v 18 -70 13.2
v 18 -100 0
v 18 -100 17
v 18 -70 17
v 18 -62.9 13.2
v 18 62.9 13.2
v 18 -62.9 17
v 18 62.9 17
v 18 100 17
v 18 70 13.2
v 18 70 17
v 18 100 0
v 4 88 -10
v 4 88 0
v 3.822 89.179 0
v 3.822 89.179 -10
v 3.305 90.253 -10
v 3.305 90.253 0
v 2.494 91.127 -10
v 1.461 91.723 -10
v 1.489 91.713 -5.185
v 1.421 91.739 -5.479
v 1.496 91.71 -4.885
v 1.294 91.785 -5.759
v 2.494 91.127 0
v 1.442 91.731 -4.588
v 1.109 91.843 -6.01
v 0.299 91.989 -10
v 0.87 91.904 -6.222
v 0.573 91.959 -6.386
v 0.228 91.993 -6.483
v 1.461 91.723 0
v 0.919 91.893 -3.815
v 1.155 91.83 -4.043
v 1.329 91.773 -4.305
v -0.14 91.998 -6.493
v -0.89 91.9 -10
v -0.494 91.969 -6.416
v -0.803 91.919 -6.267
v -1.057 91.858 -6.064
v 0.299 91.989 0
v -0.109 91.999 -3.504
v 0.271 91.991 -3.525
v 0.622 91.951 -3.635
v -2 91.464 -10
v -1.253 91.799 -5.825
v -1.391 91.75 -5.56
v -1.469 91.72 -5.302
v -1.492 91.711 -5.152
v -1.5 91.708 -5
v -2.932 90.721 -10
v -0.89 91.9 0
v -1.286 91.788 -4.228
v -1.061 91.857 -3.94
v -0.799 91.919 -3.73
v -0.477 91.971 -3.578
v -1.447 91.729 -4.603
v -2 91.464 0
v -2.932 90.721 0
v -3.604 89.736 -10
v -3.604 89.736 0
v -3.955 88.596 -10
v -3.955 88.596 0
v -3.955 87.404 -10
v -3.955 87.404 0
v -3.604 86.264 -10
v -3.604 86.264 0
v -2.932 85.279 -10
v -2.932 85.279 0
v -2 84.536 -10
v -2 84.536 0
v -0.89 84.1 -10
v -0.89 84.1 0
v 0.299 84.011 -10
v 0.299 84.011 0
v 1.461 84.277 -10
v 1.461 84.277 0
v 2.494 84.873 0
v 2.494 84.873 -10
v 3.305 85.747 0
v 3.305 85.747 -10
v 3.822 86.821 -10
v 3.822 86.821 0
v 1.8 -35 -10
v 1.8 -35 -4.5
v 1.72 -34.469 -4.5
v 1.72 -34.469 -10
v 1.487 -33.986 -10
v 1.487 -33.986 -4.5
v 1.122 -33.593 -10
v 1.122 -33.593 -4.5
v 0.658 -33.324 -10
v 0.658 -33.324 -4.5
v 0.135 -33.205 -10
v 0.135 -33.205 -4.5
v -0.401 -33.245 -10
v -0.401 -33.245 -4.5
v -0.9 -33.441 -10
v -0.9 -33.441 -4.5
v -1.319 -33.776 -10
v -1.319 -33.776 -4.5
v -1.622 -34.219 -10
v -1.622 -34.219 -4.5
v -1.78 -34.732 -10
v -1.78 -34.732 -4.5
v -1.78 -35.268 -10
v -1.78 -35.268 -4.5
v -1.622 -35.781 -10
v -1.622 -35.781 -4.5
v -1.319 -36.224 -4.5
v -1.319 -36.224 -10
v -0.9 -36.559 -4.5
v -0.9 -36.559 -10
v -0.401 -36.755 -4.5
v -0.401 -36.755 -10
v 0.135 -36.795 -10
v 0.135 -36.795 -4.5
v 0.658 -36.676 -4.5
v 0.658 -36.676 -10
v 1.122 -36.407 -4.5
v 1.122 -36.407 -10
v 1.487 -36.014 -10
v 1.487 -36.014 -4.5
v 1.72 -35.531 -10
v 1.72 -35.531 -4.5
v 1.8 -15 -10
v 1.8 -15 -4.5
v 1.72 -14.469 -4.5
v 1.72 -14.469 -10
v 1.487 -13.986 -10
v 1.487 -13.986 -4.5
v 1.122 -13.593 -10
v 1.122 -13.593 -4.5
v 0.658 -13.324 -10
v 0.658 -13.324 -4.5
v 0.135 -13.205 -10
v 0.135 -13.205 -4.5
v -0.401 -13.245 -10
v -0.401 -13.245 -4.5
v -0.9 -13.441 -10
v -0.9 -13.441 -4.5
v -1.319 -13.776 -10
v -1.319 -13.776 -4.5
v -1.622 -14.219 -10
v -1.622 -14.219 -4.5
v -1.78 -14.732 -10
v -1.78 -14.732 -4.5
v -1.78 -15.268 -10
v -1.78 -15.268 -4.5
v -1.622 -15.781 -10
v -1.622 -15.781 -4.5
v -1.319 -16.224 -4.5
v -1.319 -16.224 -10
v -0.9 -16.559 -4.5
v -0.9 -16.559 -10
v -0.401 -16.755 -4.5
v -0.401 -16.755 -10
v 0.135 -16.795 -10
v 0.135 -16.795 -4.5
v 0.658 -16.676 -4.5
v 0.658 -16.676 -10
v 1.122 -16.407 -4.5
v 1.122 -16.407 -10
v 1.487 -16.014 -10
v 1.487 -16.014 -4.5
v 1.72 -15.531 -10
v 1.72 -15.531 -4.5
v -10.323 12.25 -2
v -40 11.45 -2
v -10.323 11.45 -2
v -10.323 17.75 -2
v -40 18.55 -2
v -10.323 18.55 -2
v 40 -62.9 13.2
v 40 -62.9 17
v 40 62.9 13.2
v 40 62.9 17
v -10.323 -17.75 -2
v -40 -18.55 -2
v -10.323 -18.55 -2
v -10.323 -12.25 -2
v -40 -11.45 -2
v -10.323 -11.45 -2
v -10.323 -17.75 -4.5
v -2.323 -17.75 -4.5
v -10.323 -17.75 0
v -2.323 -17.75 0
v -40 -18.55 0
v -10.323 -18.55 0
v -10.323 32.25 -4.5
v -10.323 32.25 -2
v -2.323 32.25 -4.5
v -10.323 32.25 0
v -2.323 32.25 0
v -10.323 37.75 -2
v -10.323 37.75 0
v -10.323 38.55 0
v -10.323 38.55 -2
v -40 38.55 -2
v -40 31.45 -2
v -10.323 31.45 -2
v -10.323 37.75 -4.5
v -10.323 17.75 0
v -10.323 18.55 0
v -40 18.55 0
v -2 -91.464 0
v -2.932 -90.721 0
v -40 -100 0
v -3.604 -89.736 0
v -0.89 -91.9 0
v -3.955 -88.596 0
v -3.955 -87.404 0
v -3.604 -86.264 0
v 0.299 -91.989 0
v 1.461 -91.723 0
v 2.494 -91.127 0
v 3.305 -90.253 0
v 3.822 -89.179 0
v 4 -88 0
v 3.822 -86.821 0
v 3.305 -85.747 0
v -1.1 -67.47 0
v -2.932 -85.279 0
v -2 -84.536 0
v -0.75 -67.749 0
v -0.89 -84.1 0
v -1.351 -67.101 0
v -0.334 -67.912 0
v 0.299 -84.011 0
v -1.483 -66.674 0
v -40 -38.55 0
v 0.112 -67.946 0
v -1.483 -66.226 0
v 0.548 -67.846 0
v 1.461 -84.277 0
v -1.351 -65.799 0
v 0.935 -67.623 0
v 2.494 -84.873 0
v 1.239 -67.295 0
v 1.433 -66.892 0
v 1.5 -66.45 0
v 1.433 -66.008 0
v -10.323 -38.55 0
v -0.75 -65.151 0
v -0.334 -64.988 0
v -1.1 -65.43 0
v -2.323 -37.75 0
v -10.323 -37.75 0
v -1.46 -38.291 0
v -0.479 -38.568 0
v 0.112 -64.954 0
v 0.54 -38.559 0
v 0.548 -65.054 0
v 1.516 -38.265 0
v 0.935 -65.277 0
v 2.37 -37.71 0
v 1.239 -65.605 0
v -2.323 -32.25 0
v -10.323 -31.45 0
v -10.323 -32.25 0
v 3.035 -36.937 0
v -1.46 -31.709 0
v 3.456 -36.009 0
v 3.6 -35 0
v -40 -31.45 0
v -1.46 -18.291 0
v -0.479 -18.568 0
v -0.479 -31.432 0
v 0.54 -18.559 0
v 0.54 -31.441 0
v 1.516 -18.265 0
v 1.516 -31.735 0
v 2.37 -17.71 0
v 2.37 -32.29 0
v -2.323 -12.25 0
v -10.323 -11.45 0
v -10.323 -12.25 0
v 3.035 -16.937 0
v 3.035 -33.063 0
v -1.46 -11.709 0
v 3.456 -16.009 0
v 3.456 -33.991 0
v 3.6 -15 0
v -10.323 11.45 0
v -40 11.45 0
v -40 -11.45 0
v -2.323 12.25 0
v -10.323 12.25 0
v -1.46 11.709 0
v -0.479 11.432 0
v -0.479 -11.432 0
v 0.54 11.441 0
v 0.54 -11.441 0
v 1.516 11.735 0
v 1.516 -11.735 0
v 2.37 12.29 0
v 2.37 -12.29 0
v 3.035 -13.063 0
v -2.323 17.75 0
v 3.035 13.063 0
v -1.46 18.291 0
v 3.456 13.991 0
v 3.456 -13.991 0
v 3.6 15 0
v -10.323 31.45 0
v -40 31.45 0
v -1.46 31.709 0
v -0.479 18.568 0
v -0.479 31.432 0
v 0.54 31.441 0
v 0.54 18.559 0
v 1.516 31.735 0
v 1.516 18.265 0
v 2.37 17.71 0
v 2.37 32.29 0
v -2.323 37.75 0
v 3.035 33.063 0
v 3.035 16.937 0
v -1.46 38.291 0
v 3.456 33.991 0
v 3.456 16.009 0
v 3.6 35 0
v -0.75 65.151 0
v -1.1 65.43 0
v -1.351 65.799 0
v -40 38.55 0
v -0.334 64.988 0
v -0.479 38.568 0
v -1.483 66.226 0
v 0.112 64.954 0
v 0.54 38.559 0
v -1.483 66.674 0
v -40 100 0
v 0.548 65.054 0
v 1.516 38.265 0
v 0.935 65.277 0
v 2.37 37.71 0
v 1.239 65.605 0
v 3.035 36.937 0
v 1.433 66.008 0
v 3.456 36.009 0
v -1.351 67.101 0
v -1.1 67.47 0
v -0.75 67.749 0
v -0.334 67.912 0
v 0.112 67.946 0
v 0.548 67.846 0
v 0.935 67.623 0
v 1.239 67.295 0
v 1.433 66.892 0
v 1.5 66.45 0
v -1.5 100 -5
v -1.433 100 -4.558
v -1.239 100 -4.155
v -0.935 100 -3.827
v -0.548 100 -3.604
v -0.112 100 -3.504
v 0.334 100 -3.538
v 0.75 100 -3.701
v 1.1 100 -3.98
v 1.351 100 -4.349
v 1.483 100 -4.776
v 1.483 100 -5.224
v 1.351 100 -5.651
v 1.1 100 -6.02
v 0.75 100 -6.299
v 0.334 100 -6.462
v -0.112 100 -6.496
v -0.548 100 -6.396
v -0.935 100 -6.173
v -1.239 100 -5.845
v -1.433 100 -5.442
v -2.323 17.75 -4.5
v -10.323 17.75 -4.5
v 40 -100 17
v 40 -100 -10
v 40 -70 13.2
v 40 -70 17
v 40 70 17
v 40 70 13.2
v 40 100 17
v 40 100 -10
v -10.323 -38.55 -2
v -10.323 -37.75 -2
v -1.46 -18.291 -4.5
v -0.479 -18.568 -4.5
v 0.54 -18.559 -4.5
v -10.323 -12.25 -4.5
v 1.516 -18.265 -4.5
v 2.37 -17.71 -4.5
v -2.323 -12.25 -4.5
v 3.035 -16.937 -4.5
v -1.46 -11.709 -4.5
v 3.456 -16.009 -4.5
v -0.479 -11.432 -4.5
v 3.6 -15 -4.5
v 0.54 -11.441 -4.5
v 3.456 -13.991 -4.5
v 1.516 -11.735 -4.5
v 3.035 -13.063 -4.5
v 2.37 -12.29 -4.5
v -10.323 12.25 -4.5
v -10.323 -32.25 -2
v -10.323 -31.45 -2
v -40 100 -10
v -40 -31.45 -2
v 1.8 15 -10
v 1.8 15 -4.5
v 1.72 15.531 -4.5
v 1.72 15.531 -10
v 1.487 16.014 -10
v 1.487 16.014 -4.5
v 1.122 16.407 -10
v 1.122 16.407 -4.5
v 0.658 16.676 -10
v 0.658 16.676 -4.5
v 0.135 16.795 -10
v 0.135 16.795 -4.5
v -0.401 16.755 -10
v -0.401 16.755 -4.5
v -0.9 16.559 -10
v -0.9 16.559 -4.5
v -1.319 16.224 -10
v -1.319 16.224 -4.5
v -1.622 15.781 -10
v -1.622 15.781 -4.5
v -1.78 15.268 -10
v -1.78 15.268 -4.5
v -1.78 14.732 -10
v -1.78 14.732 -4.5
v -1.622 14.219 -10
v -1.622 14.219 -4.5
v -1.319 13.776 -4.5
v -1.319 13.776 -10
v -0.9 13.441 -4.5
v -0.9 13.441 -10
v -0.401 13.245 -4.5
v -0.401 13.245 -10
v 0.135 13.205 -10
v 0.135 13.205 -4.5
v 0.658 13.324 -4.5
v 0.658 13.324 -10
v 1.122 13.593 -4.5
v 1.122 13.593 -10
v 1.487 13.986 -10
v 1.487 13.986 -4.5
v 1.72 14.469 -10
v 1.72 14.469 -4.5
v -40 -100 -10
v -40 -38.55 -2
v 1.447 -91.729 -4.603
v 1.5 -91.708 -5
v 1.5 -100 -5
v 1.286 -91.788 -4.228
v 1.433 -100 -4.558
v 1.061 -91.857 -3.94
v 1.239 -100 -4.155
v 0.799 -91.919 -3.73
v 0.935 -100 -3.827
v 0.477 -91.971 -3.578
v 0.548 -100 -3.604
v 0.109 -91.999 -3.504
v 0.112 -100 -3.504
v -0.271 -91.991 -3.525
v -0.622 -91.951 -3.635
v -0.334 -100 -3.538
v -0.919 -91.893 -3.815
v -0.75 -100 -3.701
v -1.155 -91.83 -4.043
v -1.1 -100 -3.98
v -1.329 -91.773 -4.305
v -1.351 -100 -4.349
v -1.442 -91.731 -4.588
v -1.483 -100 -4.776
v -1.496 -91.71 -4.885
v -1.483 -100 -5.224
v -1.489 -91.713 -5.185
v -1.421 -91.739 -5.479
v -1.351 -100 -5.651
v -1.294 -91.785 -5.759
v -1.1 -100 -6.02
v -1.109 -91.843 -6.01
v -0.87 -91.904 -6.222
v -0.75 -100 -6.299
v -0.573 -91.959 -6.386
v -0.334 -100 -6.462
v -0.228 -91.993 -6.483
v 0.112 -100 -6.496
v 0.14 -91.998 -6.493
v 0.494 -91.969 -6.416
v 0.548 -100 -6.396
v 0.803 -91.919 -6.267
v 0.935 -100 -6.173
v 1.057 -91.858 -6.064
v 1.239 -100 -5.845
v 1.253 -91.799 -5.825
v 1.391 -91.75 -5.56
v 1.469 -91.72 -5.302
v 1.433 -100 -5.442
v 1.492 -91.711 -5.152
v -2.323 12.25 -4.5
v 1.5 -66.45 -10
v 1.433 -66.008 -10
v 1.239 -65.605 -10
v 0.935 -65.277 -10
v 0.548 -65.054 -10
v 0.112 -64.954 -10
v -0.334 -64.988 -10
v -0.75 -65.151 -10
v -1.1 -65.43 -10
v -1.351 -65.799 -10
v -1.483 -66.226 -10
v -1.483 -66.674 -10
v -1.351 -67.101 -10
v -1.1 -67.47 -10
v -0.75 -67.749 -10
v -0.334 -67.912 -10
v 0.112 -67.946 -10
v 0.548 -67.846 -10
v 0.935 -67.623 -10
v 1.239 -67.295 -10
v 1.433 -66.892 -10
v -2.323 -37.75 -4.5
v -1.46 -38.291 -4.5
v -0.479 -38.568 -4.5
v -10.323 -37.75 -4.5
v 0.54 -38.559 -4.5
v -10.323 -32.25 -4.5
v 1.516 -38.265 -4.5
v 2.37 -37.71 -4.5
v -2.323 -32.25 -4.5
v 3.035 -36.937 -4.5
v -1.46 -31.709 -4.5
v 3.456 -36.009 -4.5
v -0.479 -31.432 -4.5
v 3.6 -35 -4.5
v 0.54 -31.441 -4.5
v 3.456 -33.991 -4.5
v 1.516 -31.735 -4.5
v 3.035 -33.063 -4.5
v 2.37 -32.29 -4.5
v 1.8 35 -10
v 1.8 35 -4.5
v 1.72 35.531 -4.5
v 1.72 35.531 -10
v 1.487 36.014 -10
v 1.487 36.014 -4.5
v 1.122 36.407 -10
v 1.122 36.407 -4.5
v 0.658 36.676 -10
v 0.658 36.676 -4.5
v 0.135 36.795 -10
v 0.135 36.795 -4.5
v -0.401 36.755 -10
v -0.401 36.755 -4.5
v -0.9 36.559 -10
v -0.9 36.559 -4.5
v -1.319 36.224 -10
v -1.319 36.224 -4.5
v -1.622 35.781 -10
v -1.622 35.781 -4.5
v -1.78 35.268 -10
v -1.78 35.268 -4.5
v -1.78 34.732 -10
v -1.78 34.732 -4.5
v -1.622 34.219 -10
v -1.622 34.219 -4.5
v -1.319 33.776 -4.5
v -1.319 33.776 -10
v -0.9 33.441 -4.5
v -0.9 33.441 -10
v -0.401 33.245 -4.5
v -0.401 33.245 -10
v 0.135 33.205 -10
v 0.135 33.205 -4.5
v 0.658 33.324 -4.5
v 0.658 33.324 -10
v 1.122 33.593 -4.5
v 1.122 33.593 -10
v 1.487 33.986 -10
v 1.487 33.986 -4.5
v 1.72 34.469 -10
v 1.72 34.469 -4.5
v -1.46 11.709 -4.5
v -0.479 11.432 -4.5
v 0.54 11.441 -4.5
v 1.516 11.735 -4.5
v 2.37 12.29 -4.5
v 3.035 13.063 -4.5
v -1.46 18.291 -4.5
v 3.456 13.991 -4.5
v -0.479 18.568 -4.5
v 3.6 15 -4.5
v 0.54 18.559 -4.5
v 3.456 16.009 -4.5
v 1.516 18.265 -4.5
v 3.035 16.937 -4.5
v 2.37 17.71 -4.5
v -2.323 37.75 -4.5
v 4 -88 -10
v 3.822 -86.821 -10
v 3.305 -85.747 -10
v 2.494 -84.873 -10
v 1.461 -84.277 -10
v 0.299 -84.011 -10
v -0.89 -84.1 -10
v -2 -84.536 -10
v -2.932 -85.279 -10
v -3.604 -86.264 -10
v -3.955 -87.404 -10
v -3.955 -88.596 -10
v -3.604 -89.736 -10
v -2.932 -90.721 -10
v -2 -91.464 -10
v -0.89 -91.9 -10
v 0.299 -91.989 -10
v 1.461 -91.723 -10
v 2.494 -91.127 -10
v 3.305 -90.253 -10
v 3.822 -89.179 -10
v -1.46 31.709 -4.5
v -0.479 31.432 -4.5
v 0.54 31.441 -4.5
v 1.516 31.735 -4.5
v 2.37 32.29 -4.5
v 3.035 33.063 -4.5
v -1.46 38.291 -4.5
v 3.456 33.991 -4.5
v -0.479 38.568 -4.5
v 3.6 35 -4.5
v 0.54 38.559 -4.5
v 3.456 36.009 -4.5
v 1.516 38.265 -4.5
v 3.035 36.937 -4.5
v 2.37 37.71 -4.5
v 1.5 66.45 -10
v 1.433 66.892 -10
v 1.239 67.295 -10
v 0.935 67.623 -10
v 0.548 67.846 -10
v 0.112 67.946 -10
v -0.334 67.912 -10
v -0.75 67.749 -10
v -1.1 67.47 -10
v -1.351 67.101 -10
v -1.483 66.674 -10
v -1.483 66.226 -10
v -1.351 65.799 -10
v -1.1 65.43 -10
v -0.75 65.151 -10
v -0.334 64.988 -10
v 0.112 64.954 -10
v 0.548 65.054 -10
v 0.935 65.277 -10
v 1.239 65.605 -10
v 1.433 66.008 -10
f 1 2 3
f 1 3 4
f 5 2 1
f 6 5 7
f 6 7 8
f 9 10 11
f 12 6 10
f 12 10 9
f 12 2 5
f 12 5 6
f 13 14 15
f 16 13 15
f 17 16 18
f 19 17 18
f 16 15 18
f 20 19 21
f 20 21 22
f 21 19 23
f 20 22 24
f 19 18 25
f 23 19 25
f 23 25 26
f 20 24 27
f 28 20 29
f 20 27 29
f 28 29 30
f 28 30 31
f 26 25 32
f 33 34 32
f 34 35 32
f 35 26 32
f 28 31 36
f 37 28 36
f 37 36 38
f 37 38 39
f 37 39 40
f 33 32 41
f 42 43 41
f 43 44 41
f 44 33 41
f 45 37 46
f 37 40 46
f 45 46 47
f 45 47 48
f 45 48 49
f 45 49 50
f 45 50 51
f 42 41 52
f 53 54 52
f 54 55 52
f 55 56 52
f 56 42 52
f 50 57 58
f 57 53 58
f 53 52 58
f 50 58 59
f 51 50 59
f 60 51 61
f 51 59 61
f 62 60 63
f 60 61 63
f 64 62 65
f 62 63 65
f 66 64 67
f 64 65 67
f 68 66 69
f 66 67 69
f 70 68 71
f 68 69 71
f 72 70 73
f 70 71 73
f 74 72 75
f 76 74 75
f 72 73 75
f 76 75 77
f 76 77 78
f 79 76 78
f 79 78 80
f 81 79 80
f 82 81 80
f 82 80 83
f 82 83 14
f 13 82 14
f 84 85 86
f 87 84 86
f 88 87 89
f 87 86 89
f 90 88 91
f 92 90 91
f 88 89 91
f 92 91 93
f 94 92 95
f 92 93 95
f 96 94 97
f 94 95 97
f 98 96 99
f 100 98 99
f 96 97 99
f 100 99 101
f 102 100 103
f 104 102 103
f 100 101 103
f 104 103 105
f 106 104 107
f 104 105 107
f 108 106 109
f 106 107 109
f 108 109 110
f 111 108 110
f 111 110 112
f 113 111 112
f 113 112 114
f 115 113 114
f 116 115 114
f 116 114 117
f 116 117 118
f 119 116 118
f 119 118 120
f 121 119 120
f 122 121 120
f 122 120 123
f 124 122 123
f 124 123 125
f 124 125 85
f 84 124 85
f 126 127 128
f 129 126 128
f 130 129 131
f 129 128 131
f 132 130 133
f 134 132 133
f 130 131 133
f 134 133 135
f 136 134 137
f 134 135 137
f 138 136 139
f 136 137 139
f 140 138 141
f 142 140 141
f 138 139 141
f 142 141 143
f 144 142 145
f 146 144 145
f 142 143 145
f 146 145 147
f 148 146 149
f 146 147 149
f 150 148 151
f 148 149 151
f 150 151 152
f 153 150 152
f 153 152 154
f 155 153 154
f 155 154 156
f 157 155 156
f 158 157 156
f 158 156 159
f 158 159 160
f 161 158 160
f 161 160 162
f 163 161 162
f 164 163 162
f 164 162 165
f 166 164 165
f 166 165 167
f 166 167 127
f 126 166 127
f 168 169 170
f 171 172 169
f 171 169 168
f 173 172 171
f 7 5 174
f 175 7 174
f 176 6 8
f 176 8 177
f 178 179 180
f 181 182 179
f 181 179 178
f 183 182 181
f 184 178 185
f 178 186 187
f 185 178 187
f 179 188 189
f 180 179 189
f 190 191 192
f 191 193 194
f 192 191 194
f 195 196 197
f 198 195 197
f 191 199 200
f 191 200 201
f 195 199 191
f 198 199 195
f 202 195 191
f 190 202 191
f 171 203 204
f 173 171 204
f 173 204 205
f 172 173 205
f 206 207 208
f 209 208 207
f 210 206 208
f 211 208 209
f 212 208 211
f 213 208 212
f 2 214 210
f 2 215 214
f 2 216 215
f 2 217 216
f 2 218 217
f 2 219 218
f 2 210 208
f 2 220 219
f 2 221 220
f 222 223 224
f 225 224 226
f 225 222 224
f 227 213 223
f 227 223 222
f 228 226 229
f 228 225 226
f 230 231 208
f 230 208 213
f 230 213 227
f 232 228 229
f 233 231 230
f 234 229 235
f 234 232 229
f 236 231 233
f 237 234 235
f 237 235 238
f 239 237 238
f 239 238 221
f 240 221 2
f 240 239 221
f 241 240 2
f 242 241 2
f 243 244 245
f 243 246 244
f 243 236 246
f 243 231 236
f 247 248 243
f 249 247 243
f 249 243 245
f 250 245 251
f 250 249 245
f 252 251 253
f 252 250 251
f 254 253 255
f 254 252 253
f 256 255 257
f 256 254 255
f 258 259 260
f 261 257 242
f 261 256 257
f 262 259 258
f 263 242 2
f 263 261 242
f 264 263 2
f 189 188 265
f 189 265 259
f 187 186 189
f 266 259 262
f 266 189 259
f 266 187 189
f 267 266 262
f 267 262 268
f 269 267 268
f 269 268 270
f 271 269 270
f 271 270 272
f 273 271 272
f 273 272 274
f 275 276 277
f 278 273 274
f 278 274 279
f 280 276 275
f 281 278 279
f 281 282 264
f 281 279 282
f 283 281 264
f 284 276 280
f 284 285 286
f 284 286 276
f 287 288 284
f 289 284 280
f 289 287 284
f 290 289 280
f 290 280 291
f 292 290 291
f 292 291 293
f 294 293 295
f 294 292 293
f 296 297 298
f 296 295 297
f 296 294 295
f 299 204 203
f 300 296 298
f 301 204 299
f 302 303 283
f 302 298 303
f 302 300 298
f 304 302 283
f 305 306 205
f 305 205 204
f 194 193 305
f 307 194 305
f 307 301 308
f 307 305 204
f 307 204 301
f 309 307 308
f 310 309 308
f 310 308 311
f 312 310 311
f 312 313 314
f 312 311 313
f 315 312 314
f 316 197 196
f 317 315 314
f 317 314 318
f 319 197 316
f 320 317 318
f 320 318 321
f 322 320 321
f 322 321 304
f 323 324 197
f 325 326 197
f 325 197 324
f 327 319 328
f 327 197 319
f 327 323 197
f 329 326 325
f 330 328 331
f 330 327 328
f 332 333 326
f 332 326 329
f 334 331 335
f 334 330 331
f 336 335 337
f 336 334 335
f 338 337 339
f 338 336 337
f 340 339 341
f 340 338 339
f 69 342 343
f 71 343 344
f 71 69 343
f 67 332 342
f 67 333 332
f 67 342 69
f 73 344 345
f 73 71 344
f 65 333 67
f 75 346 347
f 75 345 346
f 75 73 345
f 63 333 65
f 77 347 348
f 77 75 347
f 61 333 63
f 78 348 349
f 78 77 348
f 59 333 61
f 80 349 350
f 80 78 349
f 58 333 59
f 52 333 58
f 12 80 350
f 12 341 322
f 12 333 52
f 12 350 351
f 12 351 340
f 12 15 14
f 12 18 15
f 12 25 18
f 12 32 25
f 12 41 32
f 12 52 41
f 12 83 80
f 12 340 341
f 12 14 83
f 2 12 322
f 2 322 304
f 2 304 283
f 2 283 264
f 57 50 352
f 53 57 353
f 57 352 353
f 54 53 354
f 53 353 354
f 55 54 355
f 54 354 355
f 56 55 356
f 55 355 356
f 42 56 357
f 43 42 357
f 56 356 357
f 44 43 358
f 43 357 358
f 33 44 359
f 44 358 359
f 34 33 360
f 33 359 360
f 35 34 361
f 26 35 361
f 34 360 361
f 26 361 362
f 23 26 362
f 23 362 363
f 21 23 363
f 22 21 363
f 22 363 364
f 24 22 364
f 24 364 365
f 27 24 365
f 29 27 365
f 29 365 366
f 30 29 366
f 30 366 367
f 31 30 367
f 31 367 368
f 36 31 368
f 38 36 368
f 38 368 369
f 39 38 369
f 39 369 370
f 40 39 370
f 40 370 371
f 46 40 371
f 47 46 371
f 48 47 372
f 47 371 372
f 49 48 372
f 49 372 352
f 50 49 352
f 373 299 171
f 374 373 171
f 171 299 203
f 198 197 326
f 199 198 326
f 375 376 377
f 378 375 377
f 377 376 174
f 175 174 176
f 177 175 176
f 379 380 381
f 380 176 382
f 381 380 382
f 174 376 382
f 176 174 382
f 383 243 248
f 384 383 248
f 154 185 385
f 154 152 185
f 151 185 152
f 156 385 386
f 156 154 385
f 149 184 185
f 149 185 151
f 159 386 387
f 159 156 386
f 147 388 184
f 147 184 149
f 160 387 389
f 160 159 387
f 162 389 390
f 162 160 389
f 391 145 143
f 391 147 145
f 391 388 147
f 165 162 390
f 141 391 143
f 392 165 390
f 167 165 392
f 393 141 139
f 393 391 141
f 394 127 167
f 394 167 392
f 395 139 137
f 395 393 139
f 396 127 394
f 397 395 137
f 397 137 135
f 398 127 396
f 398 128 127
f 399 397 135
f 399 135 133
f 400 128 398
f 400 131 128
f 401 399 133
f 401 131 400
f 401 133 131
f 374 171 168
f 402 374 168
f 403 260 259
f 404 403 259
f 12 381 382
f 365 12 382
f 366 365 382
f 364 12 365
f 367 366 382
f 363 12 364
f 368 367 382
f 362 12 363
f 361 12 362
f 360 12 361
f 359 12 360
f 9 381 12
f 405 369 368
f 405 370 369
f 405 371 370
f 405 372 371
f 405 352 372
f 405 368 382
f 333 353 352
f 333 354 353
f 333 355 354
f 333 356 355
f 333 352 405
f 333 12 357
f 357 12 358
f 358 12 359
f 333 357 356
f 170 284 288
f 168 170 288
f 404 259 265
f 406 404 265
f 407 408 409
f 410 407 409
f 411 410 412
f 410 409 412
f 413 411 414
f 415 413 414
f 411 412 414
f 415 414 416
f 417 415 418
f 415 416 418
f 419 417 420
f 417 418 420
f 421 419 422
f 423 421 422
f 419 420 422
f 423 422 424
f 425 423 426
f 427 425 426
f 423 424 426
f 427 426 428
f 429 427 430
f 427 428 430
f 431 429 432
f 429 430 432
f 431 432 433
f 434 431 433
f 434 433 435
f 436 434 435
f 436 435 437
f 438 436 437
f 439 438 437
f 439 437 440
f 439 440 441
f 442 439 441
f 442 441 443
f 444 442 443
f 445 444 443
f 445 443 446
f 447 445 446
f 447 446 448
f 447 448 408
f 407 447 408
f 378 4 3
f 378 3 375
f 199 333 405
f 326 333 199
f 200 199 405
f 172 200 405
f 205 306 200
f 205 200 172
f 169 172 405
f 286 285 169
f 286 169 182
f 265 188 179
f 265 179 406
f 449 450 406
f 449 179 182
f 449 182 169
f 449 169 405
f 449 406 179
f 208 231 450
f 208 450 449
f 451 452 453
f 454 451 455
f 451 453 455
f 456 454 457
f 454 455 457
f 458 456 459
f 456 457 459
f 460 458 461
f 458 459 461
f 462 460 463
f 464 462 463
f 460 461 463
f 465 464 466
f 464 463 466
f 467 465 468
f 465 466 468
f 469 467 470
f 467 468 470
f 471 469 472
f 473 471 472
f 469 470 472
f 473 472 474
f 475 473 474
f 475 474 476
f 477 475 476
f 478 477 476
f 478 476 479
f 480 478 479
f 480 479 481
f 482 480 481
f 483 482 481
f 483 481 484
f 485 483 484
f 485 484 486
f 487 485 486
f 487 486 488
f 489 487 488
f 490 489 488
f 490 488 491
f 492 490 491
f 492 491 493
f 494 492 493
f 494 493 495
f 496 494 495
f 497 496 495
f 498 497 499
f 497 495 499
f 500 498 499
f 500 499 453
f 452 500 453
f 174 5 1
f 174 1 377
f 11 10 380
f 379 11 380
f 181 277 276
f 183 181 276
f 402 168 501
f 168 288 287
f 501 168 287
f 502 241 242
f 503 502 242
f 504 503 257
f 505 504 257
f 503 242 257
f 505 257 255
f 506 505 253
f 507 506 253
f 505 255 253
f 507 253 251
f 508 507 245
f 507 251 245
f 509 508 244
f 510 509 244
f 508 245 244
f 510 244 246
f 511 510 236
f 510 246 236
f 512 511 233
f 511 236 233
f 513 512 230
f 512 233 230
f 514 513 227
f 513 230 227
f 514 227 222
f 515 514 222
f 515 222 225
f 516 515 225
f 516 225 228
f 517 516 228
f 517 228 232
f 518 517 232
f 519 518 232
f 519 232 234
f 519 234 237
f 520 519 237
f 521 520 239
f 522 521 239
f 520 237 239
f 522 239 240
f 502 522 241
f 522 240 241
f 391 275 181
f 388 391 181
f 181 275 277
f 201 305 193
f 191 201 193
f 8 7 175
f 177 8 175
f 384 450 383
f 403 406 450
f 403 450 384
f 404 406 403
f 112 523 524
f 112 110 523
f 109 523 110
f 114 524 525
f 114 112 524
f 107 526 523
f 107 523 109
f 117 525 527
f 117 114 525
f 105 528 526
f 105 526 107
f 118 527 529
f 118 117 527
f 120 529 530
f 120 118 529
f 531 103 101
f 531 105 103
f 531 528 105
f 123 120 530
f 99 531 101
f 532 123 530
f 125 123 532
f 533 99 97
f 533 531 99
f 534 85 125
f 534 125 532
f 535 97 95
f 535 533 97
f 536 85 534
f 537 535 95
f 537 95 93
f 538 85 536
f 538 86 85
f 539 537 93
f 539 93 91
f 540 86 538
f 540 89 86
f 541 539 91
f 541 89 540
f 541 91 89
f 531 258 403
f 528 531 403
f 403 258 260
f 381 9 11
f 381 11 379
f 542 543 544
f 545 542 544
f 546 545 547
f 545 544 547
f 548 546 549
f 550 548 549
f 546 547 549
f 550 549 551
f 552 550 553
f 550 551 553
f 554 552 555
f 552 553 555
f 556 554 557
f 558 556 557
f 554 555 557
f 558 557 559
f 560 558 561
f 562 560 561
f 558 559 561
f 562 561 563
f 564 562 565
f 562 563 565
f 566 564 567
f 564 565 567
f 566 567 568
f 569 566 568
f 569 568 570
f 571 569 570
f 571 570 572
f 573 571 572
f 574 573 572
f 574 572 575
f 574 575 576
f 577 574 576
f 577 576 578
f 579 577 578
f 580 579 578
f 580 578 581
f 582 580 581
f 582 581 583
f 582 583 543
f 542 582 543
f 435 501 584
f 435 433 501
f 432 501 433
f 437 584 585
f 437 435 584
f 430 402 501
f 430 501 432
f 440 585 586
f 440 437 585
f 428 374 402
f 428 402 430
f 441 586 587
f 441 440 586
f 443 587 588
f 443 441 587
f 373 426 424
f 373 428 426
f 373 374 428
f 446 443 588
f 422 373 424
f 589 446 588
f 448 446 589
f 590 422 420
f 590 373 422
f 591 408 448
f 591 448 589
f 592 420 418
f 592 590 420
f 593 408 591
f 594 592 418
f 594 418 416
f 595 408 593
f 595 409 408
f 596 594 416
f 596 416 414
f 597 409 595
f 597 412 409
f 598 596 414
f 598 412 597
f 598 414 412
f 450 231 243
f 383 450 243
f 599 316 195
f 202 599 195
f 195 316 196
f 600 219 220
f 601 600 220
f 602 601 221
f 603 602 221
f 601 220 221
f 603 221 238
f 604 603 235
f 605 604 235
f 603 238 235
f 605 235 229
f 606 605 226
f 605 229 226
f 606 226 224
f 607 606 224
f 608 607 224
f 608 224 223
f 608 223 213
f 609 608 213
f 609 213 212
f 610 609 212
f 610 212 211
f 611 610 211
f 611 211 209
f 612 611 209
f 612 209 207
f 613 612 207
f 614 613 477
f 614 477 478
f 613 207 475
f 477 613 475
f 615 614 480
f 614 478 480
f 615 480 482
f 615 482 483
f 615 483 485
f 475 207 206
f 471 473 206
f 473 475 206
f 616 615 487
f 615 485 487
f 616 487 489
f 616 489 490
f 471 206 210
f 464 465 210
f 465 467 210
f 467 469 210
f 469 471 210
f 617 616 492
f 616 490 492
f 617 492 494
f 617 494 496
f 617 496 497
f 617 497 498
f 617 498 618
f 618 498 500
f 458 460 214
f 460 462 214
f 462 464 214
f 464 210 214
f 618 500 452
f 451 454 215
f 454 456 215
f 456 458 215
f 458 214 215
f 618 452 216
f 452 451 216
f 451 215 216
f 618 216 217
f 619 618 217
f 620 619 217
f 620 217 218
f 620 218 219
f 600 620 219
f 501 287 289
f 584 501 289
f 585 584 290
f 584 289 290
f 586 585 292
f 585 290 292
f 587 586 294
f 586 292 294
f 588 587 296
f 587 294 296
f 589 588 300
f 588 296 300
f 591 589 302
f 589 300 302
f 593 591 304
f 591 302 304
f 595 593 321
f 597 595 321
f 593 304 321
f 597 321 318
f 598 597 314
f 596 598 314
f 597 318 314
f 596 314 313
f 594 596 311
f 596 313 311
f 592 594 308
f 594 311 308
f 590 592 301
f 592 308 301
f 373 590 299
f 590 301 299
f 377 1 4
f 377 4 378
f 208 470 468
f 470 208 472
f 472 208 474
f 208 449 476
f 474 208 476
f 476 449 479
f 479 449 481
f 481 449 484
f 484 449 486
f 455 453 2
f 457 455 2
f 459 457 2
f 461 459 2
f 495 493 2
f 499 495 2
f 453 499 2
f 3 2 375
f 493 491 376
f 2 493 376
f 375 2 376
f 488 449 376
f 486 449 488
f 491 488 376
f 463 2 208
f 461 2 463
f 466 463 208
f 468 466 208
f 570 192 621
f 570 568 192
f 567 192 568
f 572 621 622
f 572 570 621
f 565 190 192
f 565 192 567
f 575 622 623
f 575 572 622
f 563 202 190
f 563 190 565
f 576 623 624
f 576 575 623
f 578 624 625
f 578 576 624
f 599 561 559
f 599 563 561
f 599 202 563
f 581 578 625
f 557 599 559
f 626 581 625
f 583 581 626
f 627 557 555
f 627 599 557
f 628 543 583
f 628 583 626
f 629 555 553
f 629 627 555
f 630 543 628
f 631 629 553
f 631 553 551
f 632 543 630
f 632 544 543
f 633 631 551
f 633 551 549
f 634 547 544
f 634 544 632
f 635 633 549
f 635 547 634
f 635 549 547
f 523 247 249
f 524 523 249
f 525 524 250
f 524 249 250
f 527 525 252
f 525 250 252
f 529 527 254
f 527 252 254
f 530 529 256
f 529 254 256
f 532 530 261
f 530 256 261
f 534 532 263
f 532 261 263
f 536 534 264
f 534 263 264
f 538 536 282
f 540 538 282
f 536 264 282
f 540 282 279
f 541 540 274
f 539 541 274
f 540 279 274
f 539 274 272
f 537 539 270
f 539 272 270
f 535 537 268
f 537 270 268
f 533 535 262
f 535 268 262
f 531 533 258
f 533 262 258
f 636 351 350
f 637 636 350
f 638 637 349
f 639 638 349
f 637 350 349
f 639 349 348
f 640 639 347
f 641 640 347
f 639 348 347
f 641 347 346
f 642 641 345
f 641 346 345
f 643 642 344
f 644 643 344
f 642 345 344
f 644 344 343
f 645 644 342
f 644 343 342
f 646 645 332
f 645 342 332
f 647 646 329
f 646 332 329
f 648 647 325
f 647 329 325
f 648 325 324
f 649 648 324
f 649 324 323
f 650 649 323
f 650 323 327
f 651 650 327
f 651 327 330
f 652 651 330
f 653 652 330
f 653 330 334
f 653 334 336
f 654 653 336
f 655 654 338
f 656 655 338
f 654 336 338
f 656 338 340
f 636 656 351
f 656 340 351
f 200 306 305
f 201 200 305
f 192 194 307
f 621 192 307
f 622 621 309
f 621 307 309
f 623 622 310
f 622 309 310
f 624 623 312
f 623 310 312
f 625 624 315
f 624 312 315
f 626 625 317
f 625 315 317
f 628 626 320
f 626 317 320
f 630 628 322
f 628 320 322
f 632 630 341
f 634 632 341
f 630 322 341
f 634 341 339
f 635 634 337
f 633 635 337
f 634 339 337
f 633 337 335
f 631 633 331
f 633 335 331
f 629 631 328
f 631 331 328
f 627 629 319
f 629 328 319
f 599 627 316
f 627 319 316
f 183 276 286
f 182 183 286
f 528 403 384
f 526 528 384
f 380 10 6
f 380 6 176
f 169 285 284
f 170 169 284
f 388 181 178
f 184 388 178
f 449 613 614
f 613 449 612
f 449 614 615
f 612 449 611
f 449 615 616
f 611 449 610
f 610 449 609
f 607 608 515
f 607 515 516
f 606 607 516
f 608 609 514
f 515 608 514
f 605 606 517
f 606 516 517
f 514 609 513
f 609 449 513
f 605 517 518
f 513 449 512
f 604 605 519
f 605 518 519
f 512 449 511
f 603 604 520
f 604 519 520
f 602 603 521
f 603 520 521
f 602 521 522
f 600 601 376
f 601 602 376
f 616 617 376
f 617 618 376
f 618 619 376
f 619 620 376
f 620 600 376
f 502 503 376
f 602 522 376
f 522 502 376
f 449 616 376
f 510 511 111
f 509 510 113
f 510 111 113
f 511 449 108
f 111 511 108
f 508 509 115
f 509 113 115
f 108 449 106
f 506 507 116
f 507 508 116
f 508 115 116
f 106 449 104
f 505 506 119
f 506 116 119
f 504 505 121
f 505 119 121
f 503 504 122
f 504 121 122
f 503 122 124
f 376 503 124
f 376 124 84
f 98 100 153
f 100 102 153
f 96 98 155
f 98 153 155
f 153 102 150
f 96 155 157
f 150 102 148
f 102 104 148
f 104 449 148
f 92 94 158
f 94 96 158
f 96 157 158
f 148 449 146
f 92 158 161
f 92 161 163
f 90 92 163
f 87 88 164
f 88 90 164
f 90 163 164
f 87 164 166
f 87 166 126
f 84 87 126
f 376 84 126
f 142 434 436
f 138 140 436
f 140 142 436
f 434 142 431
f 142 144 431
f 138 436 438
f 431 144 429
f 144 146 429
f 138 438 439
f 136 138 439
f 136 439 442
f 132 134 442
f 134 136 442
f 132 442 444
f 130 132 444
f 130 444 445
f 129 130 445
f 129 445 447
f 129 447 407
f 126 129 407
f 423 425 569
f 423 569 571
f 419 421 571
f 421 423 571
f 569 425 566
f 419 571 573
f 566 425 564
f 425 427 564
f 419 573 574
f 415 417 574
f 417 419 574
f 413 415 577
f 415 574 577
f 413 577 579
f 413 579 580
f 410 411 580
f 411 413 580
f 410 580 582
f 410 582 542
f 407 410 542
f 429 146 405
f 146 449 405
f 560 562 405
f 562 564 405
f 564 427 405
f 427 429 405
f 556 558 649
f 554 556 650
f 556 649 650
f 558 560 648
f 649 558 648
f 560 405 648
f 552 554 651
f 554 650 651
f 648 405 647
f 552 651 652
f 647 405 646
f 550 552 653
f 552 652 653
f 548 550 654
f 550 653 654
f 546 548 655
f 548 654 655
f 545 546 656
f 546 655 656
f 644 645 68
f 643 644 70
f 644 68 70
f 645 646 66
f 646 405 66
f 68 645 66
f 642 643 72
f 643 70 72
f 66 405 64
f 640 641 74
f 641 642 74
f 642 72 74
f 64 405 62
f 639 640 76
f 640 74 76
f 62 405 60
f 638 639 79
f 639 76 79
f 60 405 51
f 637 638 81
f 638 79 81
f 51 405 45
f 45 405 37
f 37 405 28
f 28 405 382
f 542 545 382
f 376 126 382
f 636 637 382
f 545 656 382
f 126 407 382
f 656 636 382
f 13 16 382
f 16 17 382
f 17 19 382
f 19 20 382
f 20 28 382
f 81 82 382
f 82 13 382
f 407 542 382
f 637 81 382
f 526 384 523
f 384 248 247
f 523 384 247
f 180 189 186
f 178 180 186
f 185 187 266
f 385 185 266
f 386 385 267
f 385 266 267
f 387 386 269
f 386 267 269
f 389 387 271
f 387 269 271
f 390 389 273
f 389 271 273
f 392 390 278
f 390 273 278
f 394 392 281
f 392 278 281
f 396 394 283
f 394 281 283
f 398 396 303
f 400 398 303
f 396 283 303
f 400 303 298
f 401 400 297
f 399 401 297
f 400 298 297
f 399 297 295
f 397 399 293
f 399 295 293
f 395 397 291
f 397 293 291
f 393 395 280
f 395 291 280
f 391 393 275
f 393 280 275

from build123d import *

# Parameters (mm, degrees)
F0_W     = 22
F0_H     = 30
F0_R     = 4
F0_R_2   = 1.5
F0_H_2   = 7.1
F0_H_3   = 125.8
F0_R_3   = 1.8
F1_DEPTH = 10
F2_DEPTH = 4.5
F3_DEPTH = 17
F4_DEPTH = 13.2
F5_R     = 1.5
F6_DEPTH = 15
F7_R     = 1.5
F8_DEPTH = 15
F9_DEPTH = 2


# Not quite as in the source:
# - a feature names something its author has since deleted; it is built from what else it names


with BuildPart() as f1:
    # F0 (on Top) → F1 (new body)
    with BuildSketch(Plane.XY):
        with Locations((29, -85)):
            Rectangle(F0_W, F0_H)
        with BuildLine():
            Line((-40, -100), (18, -100))
            Line((18, -100), (18, -70))
            Line((18, -70), (18, -62.9))
            Line((18, -62.9), (18, 62.9))
            Line((18, 62.9), (18, 70))
            Line((18, 70), (18, 100))
            Line((18, 100), (-40, 100))
            Line((-40, 100), (-40, 38.55))
            Line((-40, 38.55), (-10.3232520311, 38.55))
            Line((-10.3232520311, 38.55), (-10.3232520311, 37.75))
            Line((-10.3232520311, 37.75), (-2.3232520311, 37.75))
            ThreePointArc((-2.3232520311, 37.75), (3.6, 35), (-2.3232520311, 32.25))
            Line((-2.3232520311, 32.25), (-10.3232520311, 32.25))
            Line((-10.3232520311, 32.25), (-10.3232520311, 31.45))
            Line((-10.3232520311, 31.45), (-40, 31.45))
            Line((-40, 31.45), (-40, 18.55))
            Line((-40, 18.55), (-10.3232520311, 18.55))
            Line((-10.3232520311, 18.55), (-10.3232520311, 17.75))
            Line((-10.3232520311, 17.75), (-2.3232520311, 17.75))
            ThreePointArc((-2.3232520311, 17.75), (3.6, 15), (-2.3232520311, 12.25))
            Line((-2.3232520311, 12.25), (-10.3232520311, 12.25))
            Line((-10.3232520311, 12.25), (-10.3232520311, 11.45))
            Line((-10.3232520311, 11.45), (-40, 11.45))
            Line((-40, 11.45), (-40, -11.45))
            Line((-40, -11.45), (-10.3232520311, -11.45))
            Line((-10.3232520311, -11.45), (-10.3232520311, -12.25))
            Line((-10.3232520311, -12.25), (-2.3232520311, -12.25))
            ThreePointArc((-2.3232520311, -12.25), (3.6, -15), (-2.3232520311, -17.75))
            Line((-2.3232520311, -17.75), (-10.3232520311, -17.75))
            Line((-10.3232520311, -17.75), (-10.3232520311, -18.55))
            Line((-10.3232520311, -18.55), (-40, -18.55))
            Line((-40, -18.55), (-40, -31.45))
            Line((-40, -31.45), (-10.3232520311, -31.45))
            Line((-10.3232520311, -31.45), (-10.3232520311, -32.25))
            Line((-10.3232520311, -32.25), (-2.3232520311, -32.25))
            ThreePointArc((-2.3232520311, -32.25), (3.6, -35), (-2.3232520311, -37.75))
            Line((-2.3232520311, -37.75), (-10.3232520311, -37.75))
            Line((-10.3232520311, -37.75), (-10.3232520311, -38.55))
            Line((-10.3232520311, -38.55), (-40, -38.55))
            Line((-40, -38.55), (-40, -100))
        make_face()
        with Locations((0, -88)):
            Circle(F0_R, mode=Mode.SUBTRACT)
        with Locations((0, -66.45)):
            Circle(F0_R_2, mode=Mode.SUBTRACT)
        with Locations((0, 66.45)):
            Circle(F0_R_2, mode=Mode.SUBTRACT)
        with Locations((0, 88)):
            Circle(F0_R, mode=Mode.SUBTRACT)
        with Locations((29, -66.45)):
            Rectangle(F0_W, F0_H_2)
        with Locations((29, 0)):
            Rectangle(F0_W, F0_H_3)
        Polygon((-40, -31.45), (-40, -38.55), (-10.3232520311, -38.55), (-10.3232520311, -37.75), (-10.3232520311, -32.25), (-10.3232520311, -31.45), align=None)
        with Locations((29, 66.45)):
            Rectangle(F0_W, F0_H_2)
        with Locations((29, 85)):
            Rectangle(F0_W, F0_H)
        Polygon((-40, -11.45), (-40, -18.55), (-10.3232520311, -18.55), (-10.3232520311, -17.75), (-10.3232520311, -12.25), (-10.3232520311, -11.45), align=None)
        Polygon((-40, 18.55), (-40, 11.45), (-10.3232520311, 11.45), (-10.3232520311, 12.25), (-10.3232520311, 17.75), (-10.3232520311, 18.55), align=None)
        Polygon((-10.3232520311, 38.55), (-40, 38.55), (-40, 31.45), (-10.3232520311, 31.45), (-10.3232520311, 32.25), (-10.3232520311, 37.75), align=None)
        with BuildLine():
            Line((-10.3232520311, 17.75), (-10.3232520311, 12.25))
            Line((-10.3232520311, 12.25), (-2.3232520311, 12.25))
            ThreePointArc((-2.3232520311, 12.25), (3.6, 15), (-2.3232520311, 17.75))
            Line((-2.3232520311, 17.75), (-10.3232520311, 17.75))
        make_face()
        with Locations((0, 15)):
            Circle(F0_R_3, mode=Mode.SUBTRACT)
        with BuildLine():
            Line((-2.3232520311, 37.75), (-10.3232520311, 37.75))
            Line((-10.3232520311, 37.75), (-10.3232520311, 32.25))
            Line((-10.3232520311, 32.25), (-2.3232520311, 32.25))
            ThreePointArc((-2.3232520311, 32.25), (3.6, 35), (-2.3232520311, 37.75))
        make_face()
        with Locations((0, 35)):
            Circle(F0_R_3, mode=Mode.SUBTRACT)
        with BuildLine():
            Line((-10.3232520311, -12.25), (-10.3232520311, -17.75))
            Line((-10.3232520311, -17.75), (-2.3232520311, -17.75))
            ThreePointArc((-2.3232520311, -17.75), (3.6, -15), (-2.3232520311, -12.25))
            Line((-2.3232520311, -12.25), (-10.3232520311, -12.25))
        make_face()
        with Locations((0, -15)):
            Circle(F0_R_3, mode=Mode.SUBTRACT)
        with BuildLine():
            Line((-10.3232520311, -32.25), (-10.3232520311, -37.75))
            Line((-10.3232520311, -37.75), (-2.3232520311, -37.75))
            ThreePointArc((-2.3232520311, -37.75), (3.6, -35), (-2.3232520311, -32.25))
            Line((-2.3232520311, -32.25), (-10.3232520311, -32.25))
        make_face()
        with Locations((0, -35)):
            Circle(F0_R_3, mode=Mode.SUBTRACT)
    extrude(amount=-F1_DEPTH)

    # F0 (on Top) → F2 (cut)
    with BuildSketch(Plane.XY):
        with BuildLine():
            Line((-10.3232520311, -32.25), (-10.3232520311, -37.75))
            Line((-10.3232520311, -37.75), (-2.3232520311, -37.75))
            ThreePointArc((-2.3232520311, -37.75), (3.6, -35), (-2.3232520311, -32.25))
            Line((-2.3232520311, -32.25), (-10.3232520311, -32.25))
        make_face()
        with Locations((0, -35)):
            Circle(F0_R_3, mode=Mode.SUBTRACT)
        with BuildLine():
            Line((-10.3232520311, -12.25), (-10.3232520311, -17.75))
            Line((-10.3232520311, -17.75), (-2.3232520311, -17.75))
            ThreePointArc((-2.3232520311, -17.75), (3.6, -15), (-2.3232520311, -12.25))
            Line((-2.3232520311, -12.25), (-10.3232520311, -12.25))
        make_face()
        with Locations((0, -15)):
            Circle(F0_R_3, mode=Mode.SUBTRACT)
        with BuildLine():
            Line((-10.3232520311, 17.75), (-10.3232520311, 12.25))
            Line((-10.3232520311, 12.25), (-2.3232520311, 12.25))
            ThreePointArc((-2.3232520311, 12.25), (3.6, 15), (-2.3232520311, 17.75))
            Line((-2.3232520311, 17.75), (-10.3232520311, 17.75))
        make_face()
        with Locations((0, 15)):
            Circle(F0_R_3, mode=Mode.SUBTRACT)
        with BuildLine():
            Line((-2.3232520311, 37.75), (-10.3232520311, 37.75))
            Line((-10.3232520311, 37.75), (-10.3232520311, 32.25))
            Line((-10.3232520311, 32.25), (-2.3232520311, 32.25))
            ThreePointArc((-2.3232520311, 32.25), (3.6, 35), (-2.3232520311, 37.75))
        make_face()
        with Locations((0, 35)):
            Circle(F0_R_3, mode=Mode.SUBTRACT)
    extrude(amount=-F2_DEPTH, mode=Mode.SUBTRACT)

    # F0 (on Top) → F3 (join)
    with BuildSketch(Plane.XY):
        with Locations((29, -85)):
            Rectangle(F0_W, F0_H)
        with Locations((29, 85)):
            Rectangle(F0_W, F0_H)
        with Locations((29, 0)):
            Rectangle(F0_W, F0_H_3)
    extrude(amount=F3_DEPTH)

    # F0 (on Top) → F4 (join)
    with BuildSketch(Plane.XY):
        with Locations((29, 66.45)):
            Rectangle(F0_W, F0_H_2)
        with Locations((29, -66.45)):
            Rectangle(F0_W, F0_H_2)
    extrude(amount=F4_DEPTH)

    # F5 (on face) → F6 (cut)
    with BuildSketch(Plane(origin=(0, 100, 0), x_dir=(-1, 0, 0), z_dir=(0, 1, 0))):
        with Locations((0, -5)):
            Circle(F5_R)
    extrude(amount=-F6_DEPTH, mode=Mode.SUBTRACT)

    # F7 (on face) → F8 (cut)
    with BuildSketch(Plane.XZ.offset(100)):
        with Locations((0, -5)):
            Circle(F7_R)
    extrude(amount=-F8_DEPTH, mode=Mode.SUBTRACT)

    # F0 (on Top) → F9 (cut)
    with BuildSketch(Plane.XY):
        Polygon((-10.3232520311, 38.55), (-40, 38.55), (-40, 31.45), (-10.3232520311, 31.45), (-10.3232520311, 32.25), (-10.3232520311, 37.75), align=None)
        Polygon((-40, 18.55), (-40, 11.45), (-10.3232520311, 11.45), (-10.3232520311, 12.25), (-10.3232520311, 17.75), (-10.3232520311, 18.55), align=None)
        Polygon((-40, -11.45), (-40, -18.55), (-10.3232520311, -18.55), (-10.3232520311, -17.75), (-10.3232520311, -12.25), (-10.3232520311, -11.45), align=None)
        Polygon((-40, -31.45), (-40, -38.55), (-10.3232520311, -38.55), (-10.3232520311, -37.75), (-10.3232520311, -32.25), (-10.3232520311, -31.45), align=None)
    extrude(amount=-F9_DEPTH, mode=Mode.SUBTRACT)


solid = f1.part
